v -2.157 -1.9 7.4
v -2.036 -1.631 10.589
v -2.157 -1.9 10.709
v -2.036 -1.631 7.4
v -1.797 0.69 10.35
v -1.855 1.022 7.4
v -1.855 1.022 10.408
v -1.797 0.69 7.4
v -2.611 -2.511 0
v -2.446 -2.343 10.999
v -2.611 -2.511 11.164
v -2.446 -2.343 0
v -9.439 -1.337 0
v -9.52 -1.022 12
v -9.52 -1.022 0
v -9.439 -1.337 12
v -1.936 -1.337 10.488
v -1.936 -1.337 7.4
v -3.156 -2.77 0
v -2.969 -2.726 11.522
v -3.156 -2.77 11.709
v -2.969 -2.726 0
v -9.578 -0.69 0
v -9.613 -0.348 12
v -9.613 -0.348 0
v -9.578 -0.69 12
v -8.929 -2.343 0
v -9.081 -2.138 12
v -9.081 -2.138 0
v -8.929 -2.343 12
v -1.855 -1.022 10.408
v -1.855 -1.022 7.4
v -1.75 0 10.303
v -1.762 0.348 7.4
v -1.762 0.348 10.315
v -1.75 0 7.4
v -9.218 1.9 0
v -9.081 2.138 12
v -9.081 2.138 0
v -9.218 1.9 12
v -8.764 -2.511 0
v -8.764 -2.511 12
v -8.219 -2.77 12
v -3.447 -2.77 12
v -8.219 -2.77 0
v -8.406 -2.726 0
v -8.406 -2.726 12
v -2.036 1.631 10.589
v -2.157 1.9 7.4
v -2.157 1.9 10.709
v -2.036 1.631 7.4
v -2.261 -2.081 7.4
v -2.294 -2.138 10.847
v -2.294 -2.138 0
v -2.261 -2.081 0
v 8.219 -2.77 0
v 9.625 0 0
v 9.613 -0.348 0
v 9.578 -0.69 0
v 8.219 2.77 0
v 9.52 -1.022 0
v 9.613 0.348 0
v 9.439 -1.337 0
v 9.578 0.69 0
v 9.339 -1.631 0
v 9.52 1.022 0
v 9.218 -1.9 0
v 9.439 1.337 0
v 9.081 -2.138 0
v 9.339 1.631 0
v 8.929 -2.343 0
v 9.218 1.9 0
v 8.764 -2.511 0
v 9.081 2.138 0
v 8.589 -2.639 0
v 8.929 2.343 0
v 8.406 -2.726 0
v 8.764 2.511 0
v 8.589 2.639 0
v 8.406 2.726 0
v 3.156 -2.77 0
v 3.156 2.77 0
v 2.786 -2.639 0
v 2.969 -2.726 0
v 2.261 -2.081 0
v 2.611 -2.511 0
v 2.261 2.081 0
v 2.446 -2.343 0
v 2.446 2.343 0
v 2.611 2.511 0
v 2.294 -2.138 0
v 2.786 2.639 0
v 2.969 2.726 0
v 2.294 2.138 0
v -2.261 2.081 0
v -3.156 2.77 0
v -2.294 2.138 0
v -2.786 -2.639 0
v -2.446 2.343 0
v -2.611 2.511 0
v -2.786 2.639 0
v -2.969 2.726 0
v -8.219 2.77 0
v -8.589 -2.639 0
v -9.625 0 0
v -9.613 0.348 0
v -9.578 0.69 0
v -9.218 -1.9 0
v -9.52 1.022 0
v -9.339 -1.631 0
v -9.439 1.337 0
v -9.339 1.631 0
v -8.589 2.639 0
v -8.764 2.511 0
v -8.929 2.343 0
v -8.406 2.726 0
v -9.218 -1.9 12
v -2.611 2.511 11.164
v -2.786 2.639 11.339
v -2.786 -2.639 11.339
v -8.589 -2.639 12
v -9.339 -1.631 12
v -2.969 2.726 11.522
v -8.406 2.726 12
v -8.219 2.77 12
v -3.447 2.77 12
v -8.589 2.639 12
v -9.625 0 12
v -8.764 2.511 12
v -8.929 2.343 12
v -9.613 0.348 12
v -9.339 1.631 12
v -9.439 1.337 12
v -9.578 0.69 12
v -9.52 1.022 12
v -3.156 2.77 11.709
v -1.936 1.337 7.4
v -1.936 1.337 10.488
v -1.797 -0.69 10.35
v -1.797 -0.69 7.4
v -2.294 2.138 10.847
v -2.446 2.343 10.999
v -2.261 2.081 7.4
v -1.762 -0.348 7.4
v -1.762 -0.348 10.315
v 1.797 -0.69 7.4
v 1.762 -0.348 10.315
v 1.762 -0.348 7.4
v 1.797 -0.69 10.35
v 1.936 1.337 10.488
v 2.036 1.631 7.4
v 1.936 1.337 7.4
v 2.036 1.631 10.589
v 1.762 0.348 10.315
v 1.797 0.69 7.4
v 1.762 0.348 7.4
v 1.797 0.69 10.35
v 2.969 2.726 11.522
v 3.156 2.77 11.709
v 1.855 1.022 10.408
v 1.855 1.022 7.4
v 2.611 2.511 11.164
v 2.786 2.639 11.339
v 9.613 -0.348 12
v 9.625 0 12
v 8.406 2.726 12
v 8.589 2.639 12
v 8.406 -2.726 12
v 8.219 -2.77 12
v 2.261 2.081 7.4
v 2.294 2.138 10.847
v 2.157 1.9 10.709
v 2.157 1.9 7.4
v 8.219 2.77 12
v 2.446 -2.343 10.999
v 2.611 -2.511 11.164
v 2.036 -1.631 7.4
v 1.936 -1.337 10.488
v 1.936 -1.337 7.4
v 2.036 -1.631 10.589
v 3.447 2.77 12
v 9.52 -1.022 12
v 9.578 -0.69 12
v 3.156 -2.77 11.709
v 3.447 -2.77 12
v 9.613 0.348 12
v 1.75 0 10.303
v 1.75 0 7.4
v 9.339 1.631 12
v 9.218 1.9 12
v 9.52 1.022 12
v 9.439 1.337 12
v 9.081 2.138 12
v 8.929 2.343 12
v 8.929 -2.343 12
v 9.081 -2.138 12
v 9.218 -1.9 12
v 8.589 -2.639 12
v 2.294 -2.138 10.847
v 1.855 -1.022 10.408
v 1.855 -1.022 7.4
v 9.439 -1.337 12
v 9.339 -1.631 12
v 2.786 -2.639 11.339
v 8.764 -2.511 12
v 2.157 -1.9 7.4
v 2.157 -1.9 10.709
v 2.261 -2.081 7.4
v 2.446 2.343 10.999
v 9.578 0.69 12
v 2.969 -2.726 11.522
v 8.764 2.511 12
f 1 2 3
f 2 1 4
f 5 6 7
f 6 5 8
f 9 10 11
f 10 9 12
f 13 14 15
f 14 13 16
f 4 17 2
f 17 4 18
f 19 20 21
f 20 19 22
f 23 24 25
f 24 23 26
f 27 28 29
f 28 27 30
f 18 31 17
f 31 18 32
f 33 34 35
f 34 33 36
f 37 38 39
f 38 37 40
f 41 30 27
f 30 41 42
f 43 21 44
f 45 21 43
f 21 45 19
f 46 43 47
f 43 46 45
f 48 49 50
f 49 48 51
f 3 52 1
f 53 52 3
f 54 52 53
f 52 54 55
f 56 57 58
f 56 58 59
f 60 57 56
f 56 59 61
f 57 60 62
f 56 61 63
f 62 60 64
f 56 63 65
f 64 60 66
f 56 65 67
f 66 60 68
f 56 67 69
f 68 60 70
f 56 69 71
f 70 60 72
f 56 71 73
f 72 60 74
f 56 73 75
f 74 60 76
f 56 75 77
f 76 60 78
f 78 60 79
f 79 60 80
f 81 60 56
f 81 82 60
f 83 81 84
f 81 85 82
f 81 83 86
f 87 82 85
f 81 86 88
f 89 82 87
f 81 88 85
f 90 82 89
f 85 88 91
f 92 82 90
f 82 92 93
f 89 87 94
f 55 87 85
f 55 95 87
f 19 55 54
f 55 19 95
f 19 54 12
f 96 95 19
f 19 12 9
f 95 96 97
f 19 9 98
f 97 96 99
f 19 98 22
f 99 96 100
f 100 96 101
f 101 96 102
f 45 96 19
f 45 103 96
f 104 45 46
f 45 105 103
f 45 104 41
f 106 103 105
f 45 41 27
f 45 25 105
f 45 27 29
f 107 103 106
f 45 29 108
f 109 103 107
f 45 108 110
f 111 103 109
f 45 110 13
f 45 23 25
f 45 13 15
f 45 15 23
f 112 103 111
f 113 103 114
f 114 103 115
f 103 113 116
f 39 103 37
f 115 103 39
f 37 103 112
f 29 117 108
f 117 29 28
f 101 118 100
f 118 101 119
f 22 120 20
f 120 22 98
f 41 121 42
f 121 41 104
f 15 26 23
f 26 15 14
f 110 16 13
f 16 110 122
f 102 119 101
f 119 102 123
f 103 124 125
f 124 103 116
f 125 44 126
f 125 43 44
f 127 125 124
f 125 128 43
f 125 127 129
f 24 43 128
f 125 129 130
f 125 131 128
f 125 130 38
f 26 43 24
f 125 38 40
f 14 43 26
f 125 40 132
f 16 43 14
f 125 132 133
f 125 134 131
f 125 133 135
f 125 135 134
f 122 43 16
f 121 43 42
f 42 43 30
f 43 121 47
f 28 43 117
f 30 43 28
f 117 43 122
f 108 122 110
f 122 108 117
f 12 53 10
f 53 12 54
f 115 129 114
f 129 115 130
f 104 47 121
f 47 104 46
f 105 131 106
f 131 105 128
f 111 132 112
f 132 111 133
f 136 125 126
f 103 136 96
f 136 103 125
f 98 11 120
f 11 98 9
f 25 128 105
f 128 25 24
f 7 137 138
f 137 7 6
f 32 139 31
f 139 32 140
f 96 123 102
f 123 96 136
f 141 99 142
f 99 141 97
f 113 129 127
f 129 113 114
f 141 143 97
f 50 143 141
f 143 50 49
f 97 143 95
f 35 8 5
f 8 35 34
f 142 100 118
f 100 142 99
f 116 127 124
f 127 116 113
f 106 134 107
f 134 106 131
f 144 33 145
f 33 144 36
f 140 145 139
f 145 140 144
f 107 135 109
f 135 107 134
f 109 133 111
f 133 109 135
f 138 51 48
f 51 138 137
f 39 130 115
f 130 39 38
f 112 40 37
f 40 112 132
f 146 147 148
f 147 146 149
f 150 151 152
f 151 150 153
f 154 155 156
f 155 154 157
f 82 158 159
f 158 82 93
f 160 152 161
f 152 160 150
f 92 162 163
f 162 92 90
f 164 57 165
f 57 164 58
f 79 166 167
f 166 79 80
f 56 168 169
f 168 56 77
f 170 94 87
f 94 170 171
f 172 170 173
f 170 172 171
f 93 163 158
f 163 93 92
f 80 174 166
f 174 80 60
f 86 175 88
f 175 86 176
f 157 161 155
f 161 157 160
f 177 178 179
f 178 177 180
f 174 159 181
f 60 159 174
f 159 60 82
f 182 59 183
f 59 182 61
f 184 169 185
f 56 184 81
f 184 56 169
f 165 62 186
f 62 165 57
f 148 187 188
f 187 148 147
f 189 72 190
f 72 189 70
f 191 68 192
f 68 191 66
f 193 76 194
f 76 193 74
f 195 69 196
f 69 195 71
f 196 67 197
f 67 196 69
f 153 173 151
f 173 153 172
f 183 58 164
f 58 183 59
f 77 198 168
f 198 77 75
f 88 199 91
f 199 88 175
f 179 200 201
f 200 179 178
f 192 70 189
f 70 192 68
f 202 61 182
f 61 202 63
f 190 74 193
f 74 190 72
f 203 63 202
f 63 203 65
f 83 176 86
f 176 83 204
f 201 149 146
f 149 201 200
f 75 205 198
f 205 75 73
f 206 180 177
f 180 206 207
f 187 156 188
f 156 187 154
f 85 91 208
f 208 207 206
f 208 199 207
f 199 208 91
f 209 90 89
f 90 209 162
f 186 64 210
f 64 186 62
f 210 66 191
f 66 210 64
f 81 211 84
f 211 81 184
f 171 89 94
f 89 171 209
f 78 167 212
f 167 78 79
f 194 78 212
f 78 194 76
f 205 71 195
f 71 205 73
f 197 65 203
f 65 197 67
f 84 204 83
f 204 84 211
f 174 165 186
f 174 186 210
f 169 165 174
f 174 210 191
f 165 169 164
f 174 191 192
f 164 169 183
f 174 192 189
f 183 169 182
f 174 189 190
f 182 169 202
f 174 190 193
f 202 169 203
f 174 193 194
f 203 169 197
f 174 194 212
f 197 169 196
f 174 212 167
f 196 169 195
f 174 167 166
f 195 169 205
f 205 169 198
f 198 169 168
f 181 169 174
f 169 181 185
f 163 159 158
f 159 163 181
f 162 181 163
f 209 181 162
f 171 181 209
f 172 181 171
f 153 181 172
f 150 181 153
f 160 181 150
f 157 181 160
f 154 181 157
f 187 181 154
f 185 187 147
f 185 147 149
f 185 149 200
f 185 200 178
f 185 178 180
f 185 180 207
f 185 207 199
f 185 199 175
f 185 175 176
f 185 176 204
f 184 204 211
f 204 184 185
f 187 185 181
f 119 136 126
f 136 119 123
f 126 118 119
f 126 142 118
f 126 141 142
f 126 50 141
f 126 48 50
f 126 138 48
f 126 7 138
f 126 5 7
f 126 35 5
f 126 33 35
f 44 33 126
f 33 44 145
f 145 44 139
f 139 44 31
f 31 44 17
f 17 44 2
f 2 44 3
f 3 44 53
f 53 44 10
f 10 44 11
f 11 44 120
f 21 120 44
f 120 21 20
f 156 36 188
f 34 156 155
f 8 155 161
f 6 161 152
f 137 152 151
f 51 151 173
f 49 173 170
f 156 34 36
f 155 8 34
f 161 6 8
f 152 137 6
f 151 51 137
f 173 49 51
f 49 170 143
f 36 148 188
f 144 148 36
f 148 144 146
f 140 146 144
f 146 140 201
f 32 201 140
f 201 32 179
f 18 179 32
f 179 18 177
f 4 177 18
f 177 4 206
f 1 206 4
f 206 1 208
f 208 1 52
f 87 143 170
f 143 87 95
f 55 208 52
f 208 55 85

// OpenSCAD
// file: coffee-container-extension.scad
HEIGHT    = 70;
_HEIGHT    = 8;

WALL      =  3;
PLAY      =  0.5;
DZ        =  2;
_LIP_H     =  6;
LIP_H     =  3;

BEND_H    =  4;

CLIP_H    = 12;
_CLIP_H    = 0;

FLY       =  3;

TOLERANCE = .17;
ATOM      =  0.007;

/*
LIP_H  =  3;
HEIGHT =  6;
CLIP_H =  3;
*/

module shape_outer() {
    translate([-160.7, -65, 0])
    import("coffee-container-extension-outer.dxf");
}

module shape_inner() {
    translate([-160.7, -65, 0])
    import("coffee-container-extension-inner.dxf");
}

module bending() {
    r = 1400;
    translate([0, 0, -r + BEND_H])
    rotate([90, 0, 0])
    cylinder(r=r, h=300, center=true, $fn=200);
}

module wall_outer(outer, inner, h, z) {
    assert(h>=BEND_H);
    translate([0, 0, z])
    intersection() {
        difference() {
            linear_extrude(h)
            difference() {
                offset(r=outer/2) shape_outer();
                offset(r=-inner/2) shape_outer();
            }
           bending();
        }
        translate([0, 0, h-BEND_H])
        bending();
    }
}

module wall_inner(outer, inner, h, z, bending=true, hollowing=true) {
    if (bending)
        assert(h>=BEND_H);
    translate([0, 0, z])
    intersection() {
        difference() {
            linear_extrude(h)
            difference() {
                offset(r=outer/2) shape_inner();
                if (hollowing)
                    offset(r=-inner/2) shape_inner();
            }
            if (bending)
                bending();
        }
        if (bending)
            translate([0, 0, h-BEND_H])
            bending();
    }
}
//!wall(WALL/2, WALL/2, 8, 0);

module clip(is_bottom=true, shrink=false) {
    h = CLIP_H;
    d = WALL*1.125 -.5/4;
    w = WALL*.75 - (shrink ? TOLERANCE*2 : 0);
    r = WALL*.5 - (shrink? TOLERANCE*2 : 0);
    
    scale([1, 1.85, 1]) {
        difference() {
            for (i=[-1, 1]) {
                hull() {
                    translate([i*d, 0, 0])
                    cylinder(r=r, h=h, $fn=50);

                    translate([i*d*2.5, 0, 0])
                    cylinder(r=r, h=h, $fn=50);
                }
            }
            translate([0, 0, is_bottom ? h : 0])
            rotate([0, 45, 0])
            cube(d*1.5, center=true);
        }

        translate([-WALL, -w/2, is_bottom ? 0 : h*.3+1])
        cube([WALL*2, w, h*.7-1]);
    }
}

module all_clips() {
    // all clips
    translate([0, 0, -FLY])
    for (k=[-1, 1])
    for (i=[-1:1])
        translate([i*WALL*(3.05 + 3.23), k*4, 0])
        clip(shrink=true);
}
//!all_clips();

module container0() {
    // Body

    wall_outer(WALL*3 - PLAY +1, -WALL*1.5, HEIGHT + DZ*2 + LIP_H + BEND_H, 0);
    wall_outer(WALL*3 - PLAY +1, -WALL*.5 ,          DZ*2 + LIP_H + BEND_H, 0);

    d = 4;
    translate([0, -2, 0])
    wall_inner(WALL*3 - PLAY +1 - d, -WALL*1.5 + d, HEIGHT + DZ*1.5, 0);

    // extra walls

    h = HEIGHT + DZ*1.5 - BEND_H - DZ;
    translate([-WALL, -37.65 - 1 -2, BEND_H])
    cube([WALL*2, 5.3+3, h]);

    w = 13.5;
    translate([-WALL, 21.38 +5 -3, BEND_H])
    cube([WALL*2, w, h]);

    translate([-WALL, 81.25 -.7+2.5, BEND_H])
    cube([WALL*2, w, h]);

    translate([-WALL, 39-2.5, BEND_H])
    cube([WALL*2, 44.5+2.5, min(HEIGHT-DZ, WALL*4)]);

    // diagonals

    for(k=[-1, 1])
        translate([-16.8*k, -3, BEND_H])
        rotate([0, 0, 40.5*k])
        translate([-WALL/2, 29+6-3, 0])
        cube([WALL, 92-5+3, WALL*2]);
}

module container() {
    difference() {
        container0();
 
        // hollowings for clips
        if (CLIP_H) {
            bot_z = - ATOM + BEND_H;
            top_z = bot_z + HEIGHT - DZ - CLIP_H + ATOM*2;
            for (zb=[[bot_z, true], [top_z, false]]) {
                z = zb[0]; b = zb[1];
                for (y=[-35.5-1, 27+.5 + 5-2, 87+2.5]) {
                    translate([0, y, z]) {
                        clip(b);
                        translate([0, 0, b ? 1 : -1]) clip(b);

                        translate([0, 0, b ? CLIP_H + 7 : -7])
                        rotate([0, 90, 0])
                        cylinder(r=2.5, h= WALL*3, center=true, $fn=50);
                        %clip();
                    }
                }
            }
        }
    }
    
    // elevate
    if (1)
        translate([0, 0, -FLY])
        cylinder(d=.5*10, h=.3, $fn=50);
}


// %linear_extrude(4.5) shape();

%intersection() {
    container();
    //translate([0, 0, 0]) rotate([0, 90, 0]) cylinder(r=10.000, h=5.0000, center=!true);
}

%//color("lightblue")
translate([0, 27.75, 8]) {
    difference() {
        translate([0, 0, -8.5])
        cube([1, 160, 17], center=true);

        translate([0, 0, -8])
        cube([2, 133.5, 16], center=true);

        translate([0, 0, 0])
        cube([2, 138.5, 16], center=true);
    }
    
    translate([500, 0, HEIGHT+6])
    difference() {
        union() {
            cube([1, 141.5, 10], center=true);

            translate([0, 0, -6])
            cube([1, 135, 12], center=true);
        }
        translate([0, 0, -10])
        cube([2, 129.5, 10], center=true);
    }
}

all_clips();

module inner_lid() {
    translate([0, -1, 0])
    wall_inner(4, 0, 1.5, 0, bending=false, hollowing=false);

    translate([0, -1.8, 0])
    wall_inner(-.3, 8, 15, 0, bending=false, hollowing=true);
}
// main file
use <coffee-container-extension.scad>

//all_clips();
clip();
